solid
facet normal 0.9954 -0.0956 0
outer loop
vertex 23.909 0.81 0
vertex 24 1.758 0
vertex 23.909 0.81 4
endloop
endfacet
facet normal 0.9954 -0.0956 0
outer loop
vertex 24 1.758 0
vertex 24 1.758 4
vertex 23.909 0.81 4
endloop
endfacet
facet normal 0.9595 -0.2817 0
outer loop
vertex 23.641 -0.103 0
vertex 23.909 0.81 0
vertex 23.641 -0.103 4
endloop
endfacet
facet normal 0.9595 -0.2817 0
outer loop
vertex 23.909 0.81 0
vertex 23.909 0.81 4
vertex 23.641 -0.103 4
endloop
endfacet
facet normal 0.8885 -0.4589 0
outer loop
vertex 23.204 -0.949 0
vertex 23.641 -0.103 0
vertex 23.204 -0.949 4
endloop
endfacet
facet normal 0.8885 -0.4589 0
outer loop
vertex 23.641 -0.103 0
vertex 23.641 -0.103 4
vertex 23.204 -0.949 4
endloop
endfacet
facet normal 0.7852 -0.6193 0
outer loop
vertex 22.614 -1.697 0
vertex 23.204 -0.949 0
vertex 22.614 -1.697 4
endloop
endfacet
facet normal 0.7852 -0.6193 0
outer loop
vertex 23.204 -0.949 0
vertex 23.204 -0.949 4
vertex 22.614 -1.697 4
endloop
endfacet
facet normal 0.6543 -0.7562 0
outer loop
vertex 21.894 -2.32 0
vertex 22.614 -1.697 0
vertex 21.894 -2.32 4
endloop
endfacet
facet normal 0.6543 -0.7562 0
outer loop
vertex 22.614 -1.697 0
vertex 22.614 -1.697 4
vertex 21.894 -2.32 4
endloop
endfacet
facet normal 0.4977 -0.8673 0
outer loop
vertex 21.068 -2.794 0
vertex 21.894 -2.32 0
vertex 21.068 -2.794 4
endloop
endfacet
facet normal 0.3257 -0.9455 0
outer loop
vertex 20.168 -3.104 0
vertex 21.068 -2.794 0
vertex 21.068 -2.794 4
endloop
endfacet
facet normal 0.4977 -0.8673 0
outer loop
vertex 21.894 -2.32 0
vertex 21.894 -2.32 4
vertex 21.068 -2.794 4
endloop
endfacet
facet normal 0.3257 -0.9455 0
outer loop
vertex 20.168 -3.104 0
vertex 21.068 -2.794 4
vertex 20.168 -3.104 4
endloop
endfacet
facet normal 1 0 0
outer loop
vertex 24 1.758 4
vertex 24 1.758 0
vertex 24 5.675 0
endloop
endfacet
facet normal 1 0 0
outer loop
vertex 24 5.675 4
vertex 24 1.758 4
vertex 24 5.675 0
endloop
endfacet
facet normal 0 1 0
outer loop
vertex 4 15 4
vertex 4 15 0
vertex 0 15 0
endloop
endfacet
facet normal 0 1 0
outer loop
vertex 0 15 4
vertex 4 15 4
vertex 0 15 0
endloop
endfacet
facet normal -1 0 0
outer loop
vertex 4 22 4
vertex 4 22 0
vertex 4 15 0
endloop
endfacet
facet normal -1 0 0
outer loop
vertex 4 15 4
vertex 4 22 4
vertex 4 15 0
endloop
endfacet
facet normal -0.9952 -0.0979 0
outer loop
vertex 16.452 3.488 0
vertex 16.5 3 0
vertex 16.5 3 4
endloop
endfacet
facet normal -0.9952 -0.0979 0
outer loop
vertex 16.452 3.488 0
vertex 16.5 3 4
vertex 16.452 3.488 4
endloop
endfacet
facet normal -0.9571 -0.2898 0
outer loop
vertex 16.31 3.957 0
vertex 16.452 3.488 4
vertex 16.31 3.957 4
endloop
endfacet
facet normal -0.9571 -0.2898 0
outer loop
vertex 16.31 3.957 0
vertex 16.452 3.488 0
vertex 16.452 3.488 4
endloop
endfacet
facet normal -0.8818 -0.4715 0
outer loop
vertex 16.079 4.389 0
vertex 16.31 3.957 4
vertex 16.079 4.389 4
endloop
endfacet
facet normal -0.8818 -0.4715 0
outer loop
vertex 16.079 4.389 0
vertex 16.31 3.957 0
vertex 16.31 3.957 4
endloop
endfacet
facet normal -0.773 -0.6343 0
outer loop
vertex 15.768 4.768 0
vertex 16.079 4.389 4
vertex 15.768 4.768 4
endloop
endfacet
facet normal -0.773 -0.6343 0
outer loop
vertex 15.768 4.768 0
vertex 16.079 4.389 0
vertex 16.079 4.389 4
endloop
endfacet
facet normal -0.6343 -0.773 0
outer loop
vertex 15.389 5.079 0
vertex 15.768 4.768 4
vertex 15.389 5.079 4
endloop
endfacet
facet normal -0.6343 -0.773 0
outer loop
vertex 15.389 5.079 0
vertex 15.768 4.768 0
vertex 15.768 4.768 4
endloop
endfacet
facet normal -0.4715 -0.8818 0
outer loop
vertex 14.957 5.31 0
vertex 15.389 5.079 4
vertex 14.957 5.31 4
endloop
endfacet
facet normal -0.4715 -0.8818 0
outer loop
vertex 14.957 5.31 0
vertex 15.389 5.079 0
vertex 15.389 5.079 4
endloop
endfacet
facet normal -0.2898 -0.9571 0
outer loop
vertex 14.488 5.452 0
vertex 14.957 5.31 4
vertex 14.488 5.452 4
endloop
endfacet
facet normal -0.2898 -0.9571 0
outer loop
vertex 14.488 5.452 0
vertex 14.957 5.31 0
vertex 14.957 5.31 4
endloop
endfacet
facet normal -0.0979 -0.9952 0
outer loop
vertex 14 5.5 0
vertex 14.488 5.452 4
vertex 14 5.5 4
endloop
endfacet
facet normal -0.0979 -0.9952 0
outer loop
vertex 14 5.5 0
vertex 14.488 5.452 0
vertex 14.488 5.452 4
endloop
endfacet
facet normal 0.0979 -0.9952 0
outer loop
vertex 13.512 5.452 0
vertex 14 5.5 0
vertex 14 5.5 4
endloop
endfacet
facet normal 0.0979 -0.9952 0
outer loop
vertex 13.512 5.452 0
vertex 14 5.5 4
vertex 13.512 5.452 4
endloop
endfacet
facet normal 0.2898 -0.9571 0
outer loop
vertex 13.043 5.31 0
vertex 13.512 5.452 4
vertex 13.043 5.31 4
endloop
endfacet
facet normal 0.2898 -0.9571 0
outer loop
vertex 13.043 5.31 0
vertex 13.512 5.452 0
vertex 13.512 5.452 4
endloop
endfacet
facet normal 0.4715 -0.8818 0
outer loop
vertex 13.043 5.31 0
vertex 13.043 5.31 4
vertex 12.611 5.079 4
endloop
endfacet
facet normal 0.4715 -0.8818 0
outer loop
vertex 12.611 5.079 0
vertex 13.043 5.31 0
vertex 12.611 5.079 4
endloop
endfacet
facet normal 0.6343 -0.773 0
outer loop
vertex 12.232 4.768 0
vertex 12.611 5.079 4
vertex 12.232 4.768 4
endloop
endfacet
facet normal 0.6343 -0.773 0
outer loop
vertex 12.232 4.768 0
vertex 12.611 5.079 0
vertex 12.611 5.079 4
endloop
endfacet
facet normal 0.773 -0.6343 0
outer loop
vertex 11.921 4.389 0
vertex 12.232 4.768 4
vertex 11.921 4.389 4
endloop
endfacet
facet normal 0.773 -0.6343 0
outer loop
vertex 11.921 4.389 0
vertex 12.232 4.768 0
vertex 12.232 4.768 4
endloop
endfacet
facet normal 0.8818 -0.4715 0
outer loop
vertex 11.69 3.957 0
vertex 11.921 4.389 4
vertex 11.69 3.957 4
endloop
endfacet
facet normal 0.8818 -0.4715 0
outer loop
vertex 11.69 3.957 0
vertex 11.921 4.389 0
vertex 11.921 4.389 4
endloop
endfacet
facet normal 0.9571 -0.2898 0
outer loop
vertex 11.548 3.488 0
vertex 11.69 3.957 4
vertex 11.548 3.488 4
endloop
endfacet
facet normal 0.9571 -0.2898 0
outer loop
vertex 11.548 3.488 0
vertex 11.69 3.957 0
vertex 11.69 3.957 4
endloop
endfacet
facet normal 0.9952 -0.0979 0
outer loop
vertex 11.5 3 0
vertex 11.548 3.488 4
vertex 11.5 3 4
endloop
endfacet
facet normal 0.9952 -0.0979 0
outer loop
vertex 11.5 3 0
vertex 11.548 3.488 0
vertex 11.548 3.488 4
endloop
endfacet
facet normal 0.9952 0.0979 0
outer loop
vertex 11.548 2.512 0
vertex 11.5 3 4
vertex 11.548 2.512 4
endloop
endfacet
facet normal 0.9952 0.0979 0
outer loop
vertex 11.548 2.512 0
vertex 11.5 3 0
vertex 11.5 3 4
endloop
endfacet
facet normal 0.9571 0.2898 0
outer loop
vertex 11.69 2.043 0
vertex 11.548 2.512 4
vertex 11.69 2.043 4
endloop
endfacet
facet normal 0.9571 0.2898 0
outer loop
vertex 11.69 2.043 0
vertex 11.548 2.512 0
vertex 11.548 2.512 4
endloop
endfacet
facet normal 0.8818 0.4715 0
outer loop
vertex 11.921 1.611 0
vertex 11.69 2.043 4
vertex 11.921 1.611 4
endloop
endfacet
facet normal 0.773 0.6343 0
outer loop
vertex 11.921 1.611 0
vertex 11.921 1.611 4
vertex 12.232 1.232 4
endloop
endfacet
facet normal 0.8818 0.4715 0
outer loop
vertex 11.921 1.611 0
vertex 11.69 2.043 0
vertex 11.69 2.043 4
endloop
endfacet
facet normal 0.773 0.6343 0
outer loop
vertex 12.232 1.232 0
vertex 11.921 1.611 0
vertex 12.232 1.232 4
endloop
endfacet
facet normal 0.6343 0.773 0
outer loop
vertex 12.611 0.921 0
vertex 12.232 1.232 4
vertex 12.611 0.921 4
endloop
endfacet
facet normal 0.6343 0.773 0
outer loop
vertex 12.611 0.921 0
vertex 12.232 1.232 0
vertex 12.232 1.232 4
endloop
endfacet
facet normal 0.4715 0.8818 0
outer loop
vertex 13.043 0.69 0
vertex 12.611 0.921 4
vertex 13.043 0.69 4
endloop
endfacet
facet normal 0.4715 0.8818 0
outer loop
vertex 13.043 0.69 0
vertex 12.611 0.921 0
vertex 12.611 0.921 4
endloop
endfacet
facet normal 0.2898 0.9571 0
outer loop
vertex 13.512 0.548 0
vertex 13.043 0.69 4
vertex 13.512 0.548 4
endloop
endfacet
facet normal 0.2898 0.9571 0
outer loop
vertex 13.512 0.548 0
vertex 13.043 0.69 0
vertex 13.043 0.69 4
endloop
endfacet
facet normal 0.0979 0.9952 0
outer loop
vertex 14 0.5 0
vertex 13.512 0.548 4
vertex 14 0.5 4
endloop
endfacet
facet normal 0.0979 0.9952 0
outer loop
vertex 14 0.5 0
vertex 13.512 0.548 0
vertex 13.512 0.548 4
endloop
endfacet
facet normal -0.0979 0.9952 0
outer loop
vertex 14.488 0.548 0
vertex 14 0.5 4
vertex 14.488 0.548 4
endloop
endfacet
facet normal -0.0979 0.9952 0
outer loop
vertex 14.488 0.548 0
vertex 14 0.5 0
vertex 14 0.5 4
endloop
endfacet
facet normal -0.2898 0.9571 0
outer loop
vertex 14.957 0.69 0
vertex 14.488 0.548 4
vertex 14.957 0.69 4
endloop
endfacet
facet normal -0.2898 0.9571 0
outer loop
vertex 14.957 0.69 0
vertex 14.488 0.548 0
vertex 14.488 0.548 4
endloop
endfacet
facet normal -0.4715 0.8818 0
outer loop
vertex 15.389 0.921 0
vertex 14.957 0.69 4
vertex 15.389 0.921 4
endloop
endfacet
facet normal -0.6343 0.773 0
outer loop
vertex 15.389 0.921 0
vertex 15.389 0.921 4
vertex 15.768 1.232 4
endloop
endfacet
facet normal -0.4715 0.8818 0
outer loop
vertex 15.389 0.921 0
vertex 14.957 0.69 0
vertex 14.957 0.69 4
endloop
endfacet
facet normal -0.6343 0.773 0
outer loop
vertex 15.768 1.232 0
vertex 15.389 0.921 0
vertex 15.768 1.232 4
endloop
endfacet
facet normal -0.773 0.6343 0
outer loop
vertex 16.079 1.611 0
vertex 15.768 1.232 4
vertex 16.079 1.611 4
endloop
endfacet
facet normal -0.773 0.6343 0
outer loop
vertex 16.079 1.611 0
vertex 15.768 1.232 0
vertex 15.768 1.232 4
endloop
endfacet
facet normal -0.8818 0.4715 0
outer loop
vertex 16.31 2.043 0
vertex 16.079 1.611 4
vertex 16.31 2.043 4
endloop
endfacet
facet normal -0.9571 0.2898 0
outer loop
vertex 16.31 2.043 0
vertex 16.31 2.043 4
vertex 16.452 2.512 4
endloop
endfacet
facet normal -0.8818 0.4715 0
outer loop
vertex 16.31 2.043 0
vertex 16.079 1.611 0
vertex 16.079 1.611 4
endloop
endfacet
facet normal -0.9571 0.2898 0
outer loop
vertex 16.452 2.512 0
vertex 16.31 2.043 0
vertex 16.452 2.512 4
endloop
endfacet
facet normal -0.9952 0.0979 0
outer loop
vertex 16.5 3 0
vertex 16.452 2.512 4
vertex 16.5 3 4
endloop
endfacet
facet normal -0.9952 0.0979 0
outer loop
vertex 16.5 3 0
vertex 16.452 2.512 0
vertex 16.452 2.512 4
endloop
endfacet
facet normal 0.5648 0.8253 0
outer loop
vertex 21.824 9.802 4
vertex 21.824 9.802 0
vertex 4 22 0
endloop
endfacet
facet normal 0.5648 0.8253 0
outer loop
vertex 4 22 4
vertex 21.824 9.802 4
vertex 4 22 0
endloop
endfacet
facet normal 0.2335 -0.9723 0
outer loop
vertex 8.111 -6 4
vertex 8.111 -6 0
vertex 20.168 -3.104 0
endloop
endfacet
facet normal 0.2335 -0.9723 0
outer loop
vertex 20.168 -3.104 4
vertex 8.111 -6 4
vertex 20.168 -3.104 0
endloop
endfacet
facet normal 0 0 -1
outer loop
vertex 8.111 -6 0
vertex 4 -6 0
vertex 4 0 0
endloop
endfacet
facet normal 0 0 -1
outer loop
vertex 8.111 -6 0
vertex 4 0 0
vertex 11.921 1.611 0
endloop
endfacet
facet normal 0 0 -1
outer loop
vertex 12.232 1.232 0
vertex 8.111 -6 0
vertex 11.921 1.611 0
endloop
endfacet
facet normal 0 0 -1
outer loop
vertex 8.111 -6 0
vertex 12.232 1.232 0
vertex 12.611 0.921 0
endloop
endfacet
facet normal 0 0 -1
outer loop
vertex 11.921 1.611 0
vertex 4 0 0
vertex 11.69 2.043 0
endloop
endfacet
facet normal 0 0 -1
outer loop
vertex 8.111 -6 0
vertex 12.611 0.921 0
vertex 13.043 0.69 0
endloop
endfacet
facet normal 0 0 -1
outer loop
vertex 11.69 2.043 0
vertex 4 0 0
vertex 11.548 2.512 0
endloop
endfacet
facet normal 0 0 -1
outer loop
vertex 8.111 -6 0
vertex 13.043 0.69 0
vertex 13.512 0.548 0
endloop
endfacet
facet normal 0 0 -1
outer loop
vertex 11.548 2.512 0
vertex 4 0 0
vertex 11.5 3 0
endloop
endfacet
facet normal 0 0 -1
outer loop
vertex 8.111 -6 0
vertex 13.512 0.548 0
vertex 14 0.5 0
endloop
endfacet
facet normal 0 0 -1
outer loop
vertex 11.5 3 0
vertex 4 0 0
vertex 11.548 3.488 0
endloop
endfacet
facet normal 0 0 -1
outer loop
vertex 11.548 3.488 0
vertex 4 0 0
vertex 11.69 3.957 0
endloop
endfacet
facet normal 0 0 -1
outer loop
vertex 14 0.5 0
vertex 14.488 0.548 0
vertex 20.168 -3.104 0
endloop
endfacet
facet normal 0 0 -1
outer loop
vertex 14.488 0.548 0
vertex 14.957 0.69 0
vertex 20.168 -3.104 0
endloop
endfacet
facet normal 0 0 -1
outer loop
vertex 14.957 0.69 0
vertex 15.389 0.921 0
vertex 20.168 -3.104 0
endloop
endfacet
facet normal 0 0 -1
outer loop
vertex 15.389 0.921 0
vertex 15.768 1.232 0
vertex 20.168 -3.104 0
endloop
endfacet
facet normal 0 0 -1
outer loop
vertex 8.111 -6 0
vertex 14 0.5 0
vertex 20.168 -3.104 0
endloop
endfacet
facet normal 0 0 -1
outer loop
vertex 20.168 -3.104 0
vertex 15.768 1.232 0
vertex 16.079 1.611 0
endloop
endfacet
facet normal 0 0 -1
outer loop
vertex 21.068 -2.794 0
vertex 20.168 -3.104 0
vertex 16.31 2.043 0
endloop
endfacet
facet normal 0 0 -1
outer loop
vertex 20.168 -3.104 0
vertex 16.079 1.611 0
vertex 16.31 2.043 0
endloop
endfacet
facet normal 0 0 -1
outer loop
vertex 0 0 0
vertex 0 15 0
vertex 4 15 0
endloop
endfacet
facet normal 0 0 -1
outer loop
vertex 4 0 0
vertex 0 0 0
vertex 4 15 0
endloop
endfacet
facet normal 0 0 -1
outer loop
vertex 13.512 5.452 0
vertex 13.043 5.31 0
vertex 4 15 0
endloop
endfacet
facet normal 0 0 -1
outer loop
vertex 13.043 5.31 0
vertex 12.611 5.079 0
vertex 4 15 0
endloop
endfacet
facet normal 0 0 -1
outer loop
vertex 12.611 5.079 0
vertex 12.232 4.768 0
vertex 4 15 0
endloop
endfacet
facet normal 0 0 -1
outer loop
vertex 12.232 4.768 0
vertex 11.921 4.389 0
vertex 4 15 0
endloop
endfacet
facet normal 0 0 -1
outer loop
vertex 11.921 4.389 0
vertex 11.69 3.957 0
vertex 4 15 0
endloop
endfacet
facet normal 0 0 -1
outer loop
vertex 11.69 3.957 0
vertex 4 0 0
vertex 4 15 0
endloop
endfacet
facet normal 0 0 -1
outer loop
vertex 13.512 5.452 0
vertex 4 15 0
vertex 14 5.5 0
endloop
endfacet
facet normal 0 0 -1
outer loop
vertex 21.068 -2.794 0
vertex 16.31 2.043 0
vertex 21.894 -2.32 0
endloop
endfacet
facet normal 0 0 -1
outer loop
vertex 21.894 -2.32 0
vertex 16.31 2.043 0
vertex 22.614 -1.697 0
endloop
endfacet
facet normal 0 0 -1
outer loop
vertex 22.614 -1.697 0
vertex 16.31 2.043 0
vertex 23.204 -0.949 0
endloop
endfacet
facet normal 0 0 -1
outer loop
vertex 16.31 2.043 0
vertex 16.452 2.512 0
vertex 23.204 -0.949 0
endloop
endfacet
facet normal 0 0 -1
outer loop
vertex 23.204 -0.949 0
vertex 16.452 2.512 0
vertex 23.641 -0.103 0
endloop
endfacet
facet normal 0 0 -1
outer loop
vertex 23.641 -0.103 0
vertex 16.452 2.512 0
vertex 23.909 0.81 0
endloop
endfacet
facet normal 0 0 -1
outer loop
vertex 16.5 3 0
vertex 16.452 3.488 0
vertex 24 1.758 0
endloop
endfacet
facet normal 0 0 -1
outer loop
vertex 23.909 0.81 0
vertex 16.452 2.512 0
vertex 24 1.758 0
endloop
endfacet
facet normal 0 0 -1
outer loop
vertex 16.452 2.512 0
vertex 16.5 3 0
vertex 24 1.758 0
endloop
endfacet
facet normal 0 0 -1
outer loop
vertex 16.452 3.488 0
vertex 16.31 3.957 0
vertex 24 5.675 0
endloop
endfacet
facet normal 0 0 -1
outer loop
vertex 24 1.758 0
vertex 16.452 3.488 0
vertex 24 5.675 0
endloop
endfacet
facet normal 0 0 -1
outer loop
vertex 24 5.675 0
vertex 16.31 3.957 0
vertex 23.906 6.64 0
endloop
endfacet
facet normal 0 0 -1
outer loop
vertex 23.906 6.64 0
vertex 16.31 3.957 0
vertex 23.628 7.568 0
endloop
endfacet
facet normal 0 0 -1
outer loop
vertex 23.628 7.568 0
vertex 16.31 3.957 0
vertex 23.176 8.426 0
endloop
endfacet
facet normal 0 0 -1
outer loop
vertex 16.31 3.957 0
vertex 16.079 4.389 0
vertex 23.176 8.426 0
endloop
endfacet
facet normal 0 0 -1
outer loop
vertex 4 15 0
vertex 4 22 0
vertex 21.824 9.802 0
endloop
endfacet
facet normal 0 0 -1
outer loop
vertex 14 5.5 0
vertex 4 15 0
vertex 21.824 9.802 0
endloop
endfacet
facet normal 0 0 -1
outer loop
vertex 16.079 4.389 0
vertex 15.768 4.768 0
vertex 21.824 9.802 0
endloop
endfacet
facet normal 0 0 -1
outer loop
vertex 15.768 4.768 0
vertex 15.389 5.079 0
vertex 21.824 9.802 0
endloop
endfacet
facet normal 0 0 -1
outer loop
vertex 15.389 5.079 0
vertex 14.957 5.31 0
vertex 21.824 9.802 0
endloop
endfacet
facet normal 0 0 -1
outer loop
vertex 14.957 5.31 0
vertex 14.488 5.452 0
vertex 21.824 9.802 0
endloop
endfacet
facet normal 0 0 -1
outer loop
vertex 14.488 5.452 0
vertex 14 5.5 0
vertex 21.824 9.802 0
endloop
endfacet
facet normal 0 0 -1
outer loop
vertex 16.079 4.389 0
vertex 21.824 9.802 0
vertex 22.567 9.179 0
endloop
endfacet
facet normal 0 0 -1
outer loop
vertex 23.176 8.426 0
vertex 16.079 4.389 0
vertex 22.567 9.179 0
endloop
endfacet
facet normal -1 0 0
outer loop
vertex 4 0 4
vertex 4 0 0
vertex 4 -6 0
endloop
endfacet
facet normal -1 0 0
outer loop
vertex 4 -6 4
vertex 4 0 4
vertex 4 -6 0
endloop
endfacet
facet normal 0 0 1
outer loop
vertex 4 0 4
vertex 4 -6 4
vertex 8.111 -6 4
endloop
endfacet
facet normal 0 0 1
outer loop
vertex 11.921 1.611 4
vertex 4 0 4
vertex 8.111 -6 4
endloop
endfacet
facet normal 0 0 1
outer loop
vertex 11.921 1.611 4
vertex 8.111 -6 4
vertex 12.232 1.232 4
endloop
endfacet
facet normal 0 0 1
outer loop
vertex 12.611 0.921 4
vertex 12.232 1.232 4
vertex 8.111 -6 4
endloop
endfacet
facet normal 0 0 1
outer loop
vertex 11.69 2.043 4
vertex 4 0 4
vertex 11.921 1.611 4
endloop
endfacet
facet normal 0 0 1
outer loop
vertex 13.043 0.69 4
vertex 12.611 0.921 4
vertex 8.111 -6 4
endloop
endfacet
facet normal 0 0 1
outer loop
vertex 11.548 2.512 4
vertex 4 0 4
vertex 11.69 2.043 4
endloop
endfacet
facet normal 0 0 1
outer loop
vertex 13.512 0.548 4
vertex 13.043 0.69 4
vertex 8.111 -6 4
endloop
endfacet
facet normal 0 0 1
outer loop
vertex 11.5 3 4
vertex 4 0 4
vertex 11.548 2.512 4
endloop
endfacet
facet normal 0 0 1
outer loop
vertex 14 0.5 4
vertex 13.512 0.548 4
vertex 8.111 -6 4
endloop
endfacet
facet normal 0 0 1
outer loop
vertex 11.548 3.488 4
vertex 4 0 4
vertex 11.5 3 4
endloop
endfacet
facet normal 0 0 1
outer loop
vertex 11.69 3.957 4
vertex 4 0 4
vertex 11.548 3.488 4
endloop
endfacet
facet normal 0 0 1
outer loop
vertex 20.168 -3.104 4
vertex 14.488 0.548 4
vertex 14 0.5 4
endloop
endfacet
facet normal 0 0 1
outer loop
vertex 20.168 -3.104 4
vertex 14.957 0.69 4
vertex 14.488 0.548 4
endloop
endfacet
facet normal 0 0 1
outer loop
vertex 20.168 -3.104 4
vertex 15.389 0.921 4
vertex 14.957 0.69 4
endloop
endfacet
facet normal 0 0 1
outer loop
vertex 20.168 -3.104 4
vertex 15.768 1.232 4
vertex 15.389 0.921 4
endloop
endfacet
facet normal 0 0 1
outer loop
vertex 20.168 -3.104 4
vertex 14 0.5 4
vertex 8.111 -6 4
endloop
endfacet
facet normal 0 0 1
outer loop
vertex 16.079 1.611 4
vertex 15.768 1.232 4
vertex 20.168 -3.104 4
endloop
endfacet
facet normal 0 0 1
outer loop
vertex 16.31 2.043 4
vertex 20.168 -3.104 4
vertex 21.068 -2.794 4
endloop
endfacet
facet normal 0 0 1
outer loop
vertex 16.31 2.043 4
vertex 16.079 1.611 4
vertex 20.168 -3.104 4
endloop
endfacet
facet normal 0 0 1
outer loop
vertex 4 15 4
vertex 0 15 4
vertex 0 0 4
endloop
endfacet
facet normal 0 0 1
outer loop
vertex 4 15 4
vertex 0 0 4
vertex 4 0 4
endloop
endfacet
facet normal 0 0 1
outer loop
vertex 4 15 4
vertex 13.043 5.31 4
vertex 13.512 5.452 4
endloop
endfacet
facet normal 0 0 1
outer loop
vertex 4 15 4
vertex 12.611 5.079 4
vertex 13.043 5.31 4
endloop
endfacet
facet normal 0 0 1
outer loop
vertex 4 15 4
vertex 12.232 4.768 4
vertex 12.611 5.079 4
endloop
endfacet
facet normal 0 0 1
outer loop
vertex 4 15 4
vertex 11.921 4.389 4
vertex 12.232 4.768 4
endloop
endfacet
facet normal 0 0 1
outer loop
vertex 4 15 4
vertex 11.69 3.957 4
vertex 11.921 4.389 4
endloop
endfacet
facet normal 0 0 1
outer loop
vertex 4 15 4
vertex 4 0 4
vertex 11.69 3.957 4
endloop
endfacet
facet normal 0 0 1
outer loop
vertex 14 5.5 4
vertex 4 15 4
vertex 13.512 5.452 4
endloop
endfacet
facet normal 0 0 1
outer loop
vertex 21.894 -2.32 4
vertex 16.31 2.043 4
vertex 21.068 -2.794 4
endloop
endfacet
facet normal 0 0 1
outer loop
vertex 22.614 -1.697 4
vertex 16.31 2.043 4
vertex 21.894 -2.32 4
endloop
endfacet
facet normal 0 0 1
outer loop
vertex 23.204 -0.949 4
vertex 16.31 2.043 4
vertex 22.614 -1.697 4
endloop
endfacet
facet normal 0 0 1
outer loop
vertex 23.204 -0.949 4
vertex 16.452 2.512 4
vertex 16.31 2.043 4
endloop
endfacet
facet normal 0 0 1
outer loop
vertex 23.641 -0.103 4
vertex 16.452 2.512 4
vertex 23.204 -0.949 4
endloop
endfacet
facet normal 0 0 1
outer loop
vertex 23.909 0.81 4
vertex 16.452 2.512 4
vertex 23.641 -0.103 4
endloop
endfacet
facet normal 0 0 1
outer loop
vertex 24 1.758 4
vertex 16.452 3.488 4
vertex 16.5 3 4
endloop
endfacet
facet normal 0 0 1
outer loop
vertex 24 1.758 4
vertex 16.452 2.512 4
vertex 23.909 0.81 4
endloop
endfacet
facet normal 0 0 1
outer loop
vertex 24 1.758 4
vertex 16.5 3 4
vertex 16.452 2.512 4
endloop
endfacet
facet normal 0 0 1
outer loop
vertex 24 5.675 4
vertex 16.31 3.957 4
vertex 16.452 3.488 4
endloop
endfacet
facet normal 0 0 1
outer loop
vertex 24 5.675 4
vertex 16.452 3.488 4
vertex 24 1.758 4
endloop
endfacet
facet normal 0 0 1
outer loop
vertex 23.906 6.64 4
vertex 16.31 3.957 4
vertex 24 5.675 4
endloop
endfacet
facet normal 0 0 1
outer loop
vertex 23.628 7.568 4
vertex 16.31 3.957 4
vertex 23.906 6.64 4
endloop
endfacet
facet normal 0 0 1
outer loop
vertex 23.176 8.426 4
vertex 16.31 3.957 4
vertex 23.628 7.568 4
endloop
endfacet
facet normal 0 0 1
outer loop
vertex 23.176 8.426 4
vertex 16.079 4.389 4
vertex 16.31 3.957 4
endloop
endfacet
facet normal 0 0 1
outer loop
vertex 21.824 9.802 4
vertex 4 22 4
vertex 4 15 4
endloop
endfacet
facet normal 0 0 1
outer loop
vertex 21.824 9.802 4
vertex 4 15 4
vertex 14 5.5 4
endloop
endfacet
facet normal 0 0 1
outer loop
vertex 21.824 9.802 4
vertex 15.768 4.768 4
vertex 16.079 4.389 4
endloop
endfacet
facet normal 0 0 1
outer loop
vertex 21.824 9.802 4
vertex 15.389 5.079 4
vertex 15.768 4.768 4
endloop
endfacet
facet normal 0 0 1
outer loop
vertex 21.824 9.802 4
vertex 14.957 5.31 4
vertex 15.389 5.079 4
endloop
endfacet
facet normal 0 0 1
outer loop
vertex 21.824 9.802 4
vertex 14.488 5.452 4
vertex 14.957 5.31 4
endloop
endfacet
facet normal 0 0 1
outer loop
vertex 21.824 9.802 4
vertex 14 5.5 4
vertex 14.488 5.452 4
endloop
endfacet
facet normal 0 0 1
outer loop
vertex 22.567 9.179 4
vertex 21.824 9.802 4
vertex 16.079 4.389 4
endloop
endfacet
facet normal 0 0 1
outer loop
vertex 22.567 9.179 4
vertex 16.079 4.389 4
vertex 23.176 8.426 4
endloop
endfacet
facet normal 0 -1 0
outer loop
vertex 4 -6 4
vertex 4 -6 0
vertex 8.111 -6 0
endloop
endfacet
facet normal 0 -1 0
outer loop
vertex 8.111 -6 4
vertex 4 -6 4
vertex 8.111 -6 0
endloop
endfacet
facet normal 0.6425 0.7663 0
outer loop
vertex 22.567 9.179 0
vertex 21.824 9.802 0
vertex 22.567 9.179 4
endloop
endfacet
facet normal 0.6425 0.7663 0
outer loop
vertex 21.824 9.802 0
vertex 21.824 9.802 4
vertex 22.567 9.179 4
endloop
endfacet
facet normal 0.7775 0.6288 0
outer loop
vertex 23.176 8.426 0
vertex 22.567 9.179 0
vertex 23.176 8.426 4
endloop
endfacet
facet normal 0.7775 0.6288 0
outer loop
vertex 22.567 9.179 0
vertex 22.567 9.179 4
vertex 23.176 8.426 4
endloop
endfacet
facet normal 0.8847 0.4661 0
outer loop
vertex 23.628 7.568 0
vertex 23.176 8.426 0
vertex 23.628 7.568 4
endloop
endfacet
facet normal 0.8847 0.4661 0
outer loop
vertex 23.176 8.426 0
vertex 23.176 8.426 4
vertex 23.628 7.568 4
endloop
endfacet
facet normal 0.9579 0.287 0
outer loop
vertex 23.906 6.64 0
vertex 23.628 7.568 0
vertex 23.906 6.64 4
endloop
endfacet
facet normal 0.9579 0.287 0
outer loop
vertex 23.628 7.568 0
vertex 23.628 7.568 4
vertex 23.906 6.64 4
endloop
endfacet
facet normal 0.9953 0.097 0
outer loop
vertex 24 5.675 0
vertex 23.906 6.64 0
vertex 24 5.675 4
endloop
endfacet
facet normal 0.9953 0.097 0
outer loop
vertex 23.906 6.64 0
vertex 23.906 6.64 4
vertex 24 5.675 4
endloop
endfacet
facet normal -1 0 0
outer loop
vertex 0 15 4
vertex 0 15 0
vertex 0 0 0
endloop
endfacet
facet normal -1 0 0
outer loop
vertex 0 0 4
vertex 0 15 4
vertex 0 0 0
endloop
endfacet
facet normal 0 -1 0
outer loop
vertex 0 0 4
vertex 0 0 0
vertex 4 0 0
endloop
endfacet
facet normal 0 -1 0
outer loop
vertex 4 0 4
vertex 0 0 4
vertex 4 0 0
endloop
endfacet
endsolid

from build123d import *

# Parameters (mm, degrees)
SKETCH_1_R      = 2.5
EXTRUDE_1_DEPTH = 4
FILLET_1_R      = 5


with BuildPart() as part:
    # ｽｹｯﾁ1 → ﾎﾞｽ - 押し出し1 (new body)
    with BuildSketch(Plane.XY):
        Polygon((0, 15), (0, 0), (4, 0), (4, -6), (8.110763801, -6), (24, -2.18322685), (24, 8.312378031), (4, 22), (4, 15), align=None)
        with Locations((14, 3)):
            Circle(SKETCH_1_R, mode=Mode.SUBTRACT)
    extrude(amount=EXTRUDE_1_DEPTH)

    # ﾌｨﾚｯﾄ1
    fillet_1_edges = [part.edges().sort_by_distance(p)[0] for p in [
        (24, -2.18322685, 2),
        (24, 8.312378031, 2),
    ]]
    fillet(fillet_1_edges, radius=FILLET_1_R)


solid = part.part
